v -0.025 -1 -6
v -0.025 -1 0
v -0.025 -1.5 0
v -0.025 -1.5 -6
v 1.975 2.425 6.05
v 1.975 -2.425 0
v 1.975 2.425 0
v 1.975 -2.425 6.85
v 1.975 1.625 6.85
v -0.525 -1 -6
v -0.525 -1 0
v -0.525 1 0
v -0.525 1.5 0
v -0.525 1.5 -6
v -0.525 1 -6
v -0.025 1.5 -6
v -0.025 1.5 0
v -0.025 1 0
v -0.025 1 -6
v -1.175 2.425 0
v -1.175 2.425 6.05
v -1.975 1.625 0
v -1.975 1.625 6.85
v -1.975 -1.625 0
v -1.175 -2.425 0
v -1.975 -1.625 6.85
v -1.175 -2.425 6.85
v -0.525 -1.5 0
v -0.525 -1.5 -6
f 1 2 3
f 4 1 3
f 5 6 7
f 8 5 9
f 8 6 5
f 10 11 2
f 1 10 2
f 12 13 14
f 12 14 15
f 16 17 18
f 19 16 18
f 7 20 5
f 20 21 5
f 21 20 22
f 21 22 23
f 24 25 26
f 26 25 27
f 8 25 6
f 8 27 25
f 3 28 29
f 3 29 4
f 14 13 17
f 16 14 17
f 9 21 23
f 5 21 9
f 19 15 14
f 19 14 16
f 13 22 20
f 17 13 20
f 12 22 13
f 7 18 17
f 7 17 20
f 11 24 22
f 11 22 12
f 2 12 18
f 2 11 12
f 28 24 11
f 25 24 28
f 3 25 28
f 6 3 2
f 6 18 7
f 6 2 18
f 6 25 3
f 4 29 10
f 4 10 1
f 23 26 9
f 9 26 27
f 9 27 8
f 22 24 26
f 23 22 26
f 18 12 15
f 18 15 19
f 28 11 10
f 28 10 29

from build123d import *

# Parameters (mm, degrees)
F0_W     = 3.95
F0_H     = 6.85
F1_DEPTH = 2.425
F2_SIZE  = 0.8
F3_W     = 0.5
F3_H     = 0.5
F4_DEPTH = 6


with BuildPart() as f1:
    # F0 (on Front) → F1 (new body, symmetric)
    with BuildSketch(Plane.XZ):
        with Locations((0, 3.425)):
            Rectangle(F0_W, F0_H)
    extrude(amount=F1_DEPTH, both=True)

    # F2
    f2_edges = [f1.edges().sort_by_distance(p)[0] for p in [
        (0, 2.425, 6.85),
        (-1.975, -2.425, 3.425),
        (-1.975, 2.425, 3.425),
    ]]
    chamfer(f2_edges, length=F2_SIZE)

    # F3 (on face) → F4 (join)
    with BuildSketch(Plane(origin=(0, 0, 0), x_dir=(1, 0, 0), z_dir=(0, 0, -1))):
        with Locations((-0.275, 1.25)):
            Rectangle(F3_W, F3_H)
        with Locations((-0.275, -1.25)):
            Rectangle(F3_W, F3_H)
    extrude(amount=F4_DEPTH)


solid = f1.part
